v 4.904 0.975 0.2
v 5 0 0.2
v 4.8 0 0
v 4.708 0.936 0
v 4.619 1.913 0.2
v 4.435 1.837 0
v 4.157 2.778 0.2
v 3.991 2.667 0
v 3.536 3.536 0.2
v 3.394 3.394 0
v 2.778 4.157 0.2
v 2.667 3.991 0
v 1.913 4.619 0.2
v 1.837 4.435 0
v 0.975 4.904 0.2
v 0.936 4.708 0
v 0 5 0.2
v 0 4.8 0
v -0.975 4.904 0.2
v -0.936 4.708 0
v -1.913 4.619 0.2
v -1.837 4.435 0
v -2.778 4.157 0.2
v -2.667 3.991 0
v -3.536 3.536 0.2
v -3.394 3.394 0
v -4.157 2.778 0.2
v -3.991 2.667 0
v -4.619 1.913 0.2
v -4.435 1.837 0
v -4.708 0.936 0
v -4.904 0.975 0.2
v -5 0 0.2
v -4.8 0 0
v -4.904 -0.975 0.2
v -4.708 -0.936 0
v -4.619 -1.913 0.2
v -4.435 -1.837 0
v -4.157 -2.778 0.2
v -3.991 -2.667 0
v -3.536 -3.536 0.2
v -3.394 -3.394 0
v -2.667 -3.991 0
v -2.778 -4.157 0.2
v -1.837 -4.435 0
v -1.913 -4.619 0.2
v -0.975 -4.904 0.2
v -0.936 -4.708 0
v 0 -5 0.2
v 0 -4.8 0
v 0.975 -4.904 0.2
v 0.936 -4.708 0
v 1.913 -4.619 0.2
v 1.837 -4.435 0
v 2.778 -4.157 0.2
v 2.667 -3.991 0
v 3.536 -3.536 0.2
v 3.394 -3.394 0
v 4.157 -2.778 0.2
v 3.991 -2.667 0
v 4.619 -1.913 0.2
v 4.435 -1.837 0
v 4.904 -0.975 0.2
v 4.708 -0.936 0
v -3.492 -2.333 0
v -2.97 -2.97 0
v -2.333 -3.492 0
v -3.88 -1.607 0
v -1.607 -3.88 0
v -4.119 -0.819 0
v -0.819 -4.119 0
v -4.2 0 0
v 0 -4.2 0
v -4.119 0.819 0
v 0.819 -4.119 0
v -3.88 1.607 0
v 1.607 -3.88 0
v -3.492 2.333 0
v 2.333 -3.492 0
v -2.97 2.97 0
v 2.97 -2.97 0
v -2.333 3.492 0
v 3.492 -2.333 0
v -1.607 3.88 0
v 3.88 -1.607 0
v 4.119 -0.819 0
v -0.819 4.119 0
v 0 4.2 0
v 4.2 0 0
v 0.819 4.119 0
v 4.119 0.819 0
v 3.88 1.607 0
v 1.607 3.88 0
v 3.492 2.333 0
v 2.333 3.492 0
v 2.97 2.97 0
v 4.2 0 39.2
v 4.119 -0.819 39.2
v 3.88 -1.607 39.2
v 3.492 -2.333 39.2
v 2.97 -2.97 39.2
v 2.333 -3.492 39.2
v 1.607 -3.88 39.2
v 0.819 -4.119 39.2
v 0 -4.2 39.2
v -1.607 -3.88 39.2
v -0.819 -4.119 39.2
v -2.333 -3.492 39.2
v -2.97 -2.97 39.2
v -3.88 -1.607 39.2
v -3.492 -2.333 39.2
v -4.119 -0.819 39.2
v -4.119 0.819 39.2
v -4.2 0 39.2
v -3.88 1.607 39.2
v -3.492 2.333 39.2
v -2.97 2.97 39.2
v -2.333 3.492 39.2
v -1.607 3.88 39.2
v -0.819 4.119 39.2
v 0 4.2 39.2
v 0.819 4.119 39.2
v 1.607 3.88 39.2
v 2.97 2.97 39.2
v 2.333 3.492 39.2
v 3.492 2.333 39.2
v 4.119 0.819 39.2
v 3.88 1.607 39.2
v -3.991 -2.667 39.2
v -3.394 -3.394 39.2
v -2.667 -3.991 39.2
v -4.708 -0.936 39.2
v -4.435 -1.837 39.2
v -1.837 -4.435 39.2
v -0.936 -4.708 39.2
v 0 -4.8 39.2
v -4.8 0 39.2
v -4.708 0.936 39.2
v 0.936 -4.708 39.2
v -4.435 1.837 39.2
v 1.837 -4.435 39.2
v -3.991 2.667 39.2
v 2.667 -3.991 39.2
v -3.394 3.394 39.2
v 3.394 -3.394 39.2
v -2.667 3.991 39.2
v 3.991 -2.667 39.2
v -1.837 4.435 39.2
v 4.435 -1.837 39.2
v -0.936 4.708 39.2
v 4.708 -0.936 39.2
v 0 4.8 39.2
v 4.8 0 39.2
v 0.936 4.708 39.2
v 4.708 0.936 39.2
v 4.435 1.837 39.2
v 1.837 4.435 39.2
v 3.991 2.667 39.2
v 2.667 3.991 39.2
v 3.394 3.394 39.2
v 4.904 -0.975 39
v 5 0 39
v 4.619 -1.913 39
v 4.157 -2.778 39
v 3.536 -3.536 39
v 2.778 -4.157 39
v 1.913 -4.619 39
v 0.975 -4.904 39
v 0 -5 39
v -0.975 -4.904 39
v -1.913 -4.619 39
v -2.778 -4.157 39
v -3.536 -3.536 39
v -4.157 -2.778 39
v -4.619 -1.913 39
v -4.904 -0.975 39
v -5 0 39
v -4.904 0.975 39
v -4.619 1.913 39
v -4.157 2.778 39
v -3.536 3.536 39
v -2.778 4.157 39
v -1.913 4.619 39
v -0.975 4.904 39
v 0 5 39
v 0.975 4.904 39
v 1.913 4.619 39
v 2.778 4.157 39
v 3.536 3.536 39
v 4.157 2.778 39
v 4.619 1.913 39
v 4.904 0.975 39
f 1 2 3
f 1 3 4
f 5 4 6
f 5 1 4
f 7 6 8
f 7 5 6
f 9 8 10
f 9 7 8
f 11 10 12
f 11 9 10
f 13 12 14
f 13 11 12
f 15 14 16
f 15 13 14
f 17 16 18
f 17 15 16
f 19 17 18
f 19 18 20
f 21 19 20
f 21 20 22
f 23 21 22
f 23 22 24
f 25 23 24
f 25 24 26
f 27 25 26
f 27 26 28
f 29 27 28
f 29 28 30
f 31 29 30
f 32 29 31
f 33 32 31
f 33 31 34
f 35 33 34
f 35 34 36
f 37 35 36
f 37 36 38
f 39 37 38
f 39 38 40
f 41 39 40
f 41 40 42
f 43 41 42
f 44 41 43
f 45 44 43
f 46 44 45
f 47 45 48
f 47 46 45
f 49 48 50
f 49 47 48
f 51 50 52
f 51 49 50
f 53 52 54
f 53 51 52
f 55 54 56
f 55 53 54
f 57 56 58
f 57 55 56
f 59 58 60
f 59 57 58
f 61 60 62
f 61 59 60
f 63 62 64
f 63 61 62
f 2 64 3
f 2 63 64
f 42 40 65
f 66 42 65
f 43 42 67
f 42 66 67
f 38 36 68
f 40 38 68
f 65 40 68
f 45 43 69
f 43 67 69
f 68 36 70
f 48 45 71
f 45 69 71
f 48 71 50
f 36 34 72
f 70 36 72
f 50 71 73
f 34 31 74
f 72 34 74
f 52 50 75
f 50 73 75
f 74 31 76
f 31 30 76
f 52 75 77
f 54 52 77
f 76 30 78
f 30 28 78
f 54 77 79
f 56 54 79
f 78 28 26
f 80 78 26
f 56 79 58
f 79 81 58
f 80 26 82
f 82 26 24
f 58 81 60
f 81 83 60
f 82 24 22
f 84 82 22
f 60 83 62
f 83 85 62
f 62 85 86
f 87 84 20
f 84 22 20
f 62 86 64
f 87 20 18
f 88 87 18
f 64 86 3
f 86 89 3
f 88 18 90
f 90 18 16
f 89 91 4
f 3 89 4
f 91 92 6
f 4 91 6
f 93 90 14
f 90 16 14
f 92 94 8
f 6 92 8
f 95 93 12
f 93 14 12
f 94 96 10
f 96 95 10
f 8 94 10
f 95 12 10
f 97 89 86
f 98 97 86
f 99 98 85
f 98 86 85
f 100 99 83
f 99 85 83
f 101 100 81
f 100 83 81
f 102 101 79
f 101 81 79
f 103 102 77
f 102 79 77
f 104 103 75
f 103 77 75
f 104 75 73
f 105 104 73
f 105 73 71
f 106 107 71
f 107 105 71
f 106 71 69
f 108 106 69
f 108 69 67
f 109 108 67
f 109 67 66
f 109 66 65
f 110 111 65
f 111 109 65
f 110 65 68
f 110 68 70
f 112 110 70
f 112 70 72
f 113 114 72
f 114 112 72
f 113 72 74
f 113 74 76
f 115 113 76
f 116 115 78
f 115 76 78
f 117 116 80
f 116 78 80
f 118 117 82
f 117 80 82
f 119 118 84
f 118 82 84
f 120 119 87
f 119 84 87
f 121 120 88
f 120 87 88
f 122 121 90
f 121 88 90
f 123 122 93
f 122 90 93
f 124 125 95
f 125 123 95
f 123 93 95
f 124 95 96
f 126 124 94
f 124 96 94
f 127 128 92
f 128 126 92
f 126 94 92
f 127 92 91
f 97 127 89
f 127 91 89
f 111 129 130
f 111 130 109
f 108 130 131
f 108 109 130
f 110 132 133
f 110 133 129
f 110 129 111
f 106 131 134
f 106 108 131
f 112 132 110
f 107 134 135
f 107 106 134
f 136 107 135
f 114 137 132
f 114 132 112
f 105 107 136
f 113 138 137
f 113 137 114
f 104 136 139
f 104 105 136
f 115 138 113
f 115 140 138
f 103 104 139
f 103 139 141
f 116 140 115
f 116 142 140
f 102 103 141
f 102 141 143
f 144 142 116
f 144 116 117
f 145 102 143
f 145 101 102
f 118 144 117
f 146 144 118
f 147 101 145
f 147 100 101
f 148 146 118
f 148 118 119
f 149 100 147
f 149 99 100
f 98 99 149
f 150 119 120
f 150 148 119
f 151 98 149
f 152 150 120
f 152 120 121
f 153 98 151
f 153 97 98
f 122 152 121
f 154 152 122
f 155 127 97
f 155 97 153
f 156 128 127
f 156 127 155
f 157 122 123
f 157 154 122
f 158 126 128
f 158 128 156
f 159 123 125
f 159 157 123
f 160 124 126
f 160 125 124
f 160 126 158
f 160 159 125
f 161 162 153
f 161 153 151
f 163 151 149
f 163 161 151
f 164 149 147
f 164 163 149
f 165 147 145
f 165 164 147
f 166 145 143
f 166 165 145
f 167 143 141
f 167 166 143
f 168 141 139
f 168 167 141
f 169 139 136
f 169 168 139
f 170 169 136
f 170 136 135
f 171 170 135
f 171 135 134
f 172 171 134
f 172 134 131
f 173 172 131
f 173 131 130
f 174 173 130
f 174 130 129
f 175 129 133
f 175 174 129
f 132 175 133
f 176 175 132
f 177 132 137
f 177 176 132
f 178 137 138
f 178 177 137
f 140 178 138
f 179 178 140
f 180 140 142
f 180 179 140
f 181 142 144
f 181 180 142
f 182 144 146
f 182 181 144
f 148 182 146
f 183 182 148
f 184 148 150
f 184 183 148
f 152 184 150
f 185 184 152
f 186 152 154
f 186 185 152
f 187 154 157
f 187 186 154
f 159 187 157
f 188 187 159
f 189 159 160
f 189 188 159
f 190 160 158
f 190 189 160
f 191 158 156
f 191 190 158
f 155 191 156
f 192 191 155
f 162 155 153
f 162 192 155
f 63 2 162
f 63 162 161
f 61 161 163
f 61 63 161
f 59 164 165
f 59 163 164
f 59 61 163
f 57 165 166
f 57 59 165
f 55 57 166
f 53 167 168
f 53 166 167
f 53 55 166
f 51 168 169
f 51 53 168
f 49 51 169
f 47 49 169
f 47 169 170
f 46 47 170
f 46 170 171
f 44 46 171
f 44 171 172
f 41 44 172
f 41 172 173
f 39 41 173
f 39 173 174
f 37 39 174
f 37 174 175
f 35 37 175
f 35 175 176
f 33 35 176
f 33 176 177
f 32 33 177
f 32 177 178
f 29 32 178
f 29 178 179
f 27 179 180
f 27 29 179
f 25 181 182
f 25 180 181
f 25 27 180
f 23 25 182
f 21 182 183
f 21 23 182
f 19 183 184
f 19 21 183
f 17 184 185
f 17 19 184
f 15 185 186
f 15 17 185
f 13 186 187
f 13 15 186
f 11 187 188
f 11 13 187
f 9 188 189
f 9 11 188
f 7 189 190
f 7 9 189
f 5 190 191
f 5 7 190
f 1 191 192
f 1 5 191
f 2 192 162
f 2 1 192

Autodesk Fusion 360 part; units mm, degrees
sketch "Esquisse1" plane through (0, 0, 0) normal (0, 0, 1) x (1, 0, 0)
  circle A0 centre (0, 0) radius 5
  circle A1 centre (0, 0) radius 4.2
  dimension "d1" = 10
  dimension "d2" = 8.4
extrude "Extrusion1" add sketch "Esquisse1" along normal blind 39.2
chamfer "Chanfrein1" distance 0.2 angle 45 1 edges at (-4.6616, -1.8081, 39.2)
chamfer "Chanfrein2" distance 0.2 angle 45 1 edges at (-4.6616, -1.8081, 0)
